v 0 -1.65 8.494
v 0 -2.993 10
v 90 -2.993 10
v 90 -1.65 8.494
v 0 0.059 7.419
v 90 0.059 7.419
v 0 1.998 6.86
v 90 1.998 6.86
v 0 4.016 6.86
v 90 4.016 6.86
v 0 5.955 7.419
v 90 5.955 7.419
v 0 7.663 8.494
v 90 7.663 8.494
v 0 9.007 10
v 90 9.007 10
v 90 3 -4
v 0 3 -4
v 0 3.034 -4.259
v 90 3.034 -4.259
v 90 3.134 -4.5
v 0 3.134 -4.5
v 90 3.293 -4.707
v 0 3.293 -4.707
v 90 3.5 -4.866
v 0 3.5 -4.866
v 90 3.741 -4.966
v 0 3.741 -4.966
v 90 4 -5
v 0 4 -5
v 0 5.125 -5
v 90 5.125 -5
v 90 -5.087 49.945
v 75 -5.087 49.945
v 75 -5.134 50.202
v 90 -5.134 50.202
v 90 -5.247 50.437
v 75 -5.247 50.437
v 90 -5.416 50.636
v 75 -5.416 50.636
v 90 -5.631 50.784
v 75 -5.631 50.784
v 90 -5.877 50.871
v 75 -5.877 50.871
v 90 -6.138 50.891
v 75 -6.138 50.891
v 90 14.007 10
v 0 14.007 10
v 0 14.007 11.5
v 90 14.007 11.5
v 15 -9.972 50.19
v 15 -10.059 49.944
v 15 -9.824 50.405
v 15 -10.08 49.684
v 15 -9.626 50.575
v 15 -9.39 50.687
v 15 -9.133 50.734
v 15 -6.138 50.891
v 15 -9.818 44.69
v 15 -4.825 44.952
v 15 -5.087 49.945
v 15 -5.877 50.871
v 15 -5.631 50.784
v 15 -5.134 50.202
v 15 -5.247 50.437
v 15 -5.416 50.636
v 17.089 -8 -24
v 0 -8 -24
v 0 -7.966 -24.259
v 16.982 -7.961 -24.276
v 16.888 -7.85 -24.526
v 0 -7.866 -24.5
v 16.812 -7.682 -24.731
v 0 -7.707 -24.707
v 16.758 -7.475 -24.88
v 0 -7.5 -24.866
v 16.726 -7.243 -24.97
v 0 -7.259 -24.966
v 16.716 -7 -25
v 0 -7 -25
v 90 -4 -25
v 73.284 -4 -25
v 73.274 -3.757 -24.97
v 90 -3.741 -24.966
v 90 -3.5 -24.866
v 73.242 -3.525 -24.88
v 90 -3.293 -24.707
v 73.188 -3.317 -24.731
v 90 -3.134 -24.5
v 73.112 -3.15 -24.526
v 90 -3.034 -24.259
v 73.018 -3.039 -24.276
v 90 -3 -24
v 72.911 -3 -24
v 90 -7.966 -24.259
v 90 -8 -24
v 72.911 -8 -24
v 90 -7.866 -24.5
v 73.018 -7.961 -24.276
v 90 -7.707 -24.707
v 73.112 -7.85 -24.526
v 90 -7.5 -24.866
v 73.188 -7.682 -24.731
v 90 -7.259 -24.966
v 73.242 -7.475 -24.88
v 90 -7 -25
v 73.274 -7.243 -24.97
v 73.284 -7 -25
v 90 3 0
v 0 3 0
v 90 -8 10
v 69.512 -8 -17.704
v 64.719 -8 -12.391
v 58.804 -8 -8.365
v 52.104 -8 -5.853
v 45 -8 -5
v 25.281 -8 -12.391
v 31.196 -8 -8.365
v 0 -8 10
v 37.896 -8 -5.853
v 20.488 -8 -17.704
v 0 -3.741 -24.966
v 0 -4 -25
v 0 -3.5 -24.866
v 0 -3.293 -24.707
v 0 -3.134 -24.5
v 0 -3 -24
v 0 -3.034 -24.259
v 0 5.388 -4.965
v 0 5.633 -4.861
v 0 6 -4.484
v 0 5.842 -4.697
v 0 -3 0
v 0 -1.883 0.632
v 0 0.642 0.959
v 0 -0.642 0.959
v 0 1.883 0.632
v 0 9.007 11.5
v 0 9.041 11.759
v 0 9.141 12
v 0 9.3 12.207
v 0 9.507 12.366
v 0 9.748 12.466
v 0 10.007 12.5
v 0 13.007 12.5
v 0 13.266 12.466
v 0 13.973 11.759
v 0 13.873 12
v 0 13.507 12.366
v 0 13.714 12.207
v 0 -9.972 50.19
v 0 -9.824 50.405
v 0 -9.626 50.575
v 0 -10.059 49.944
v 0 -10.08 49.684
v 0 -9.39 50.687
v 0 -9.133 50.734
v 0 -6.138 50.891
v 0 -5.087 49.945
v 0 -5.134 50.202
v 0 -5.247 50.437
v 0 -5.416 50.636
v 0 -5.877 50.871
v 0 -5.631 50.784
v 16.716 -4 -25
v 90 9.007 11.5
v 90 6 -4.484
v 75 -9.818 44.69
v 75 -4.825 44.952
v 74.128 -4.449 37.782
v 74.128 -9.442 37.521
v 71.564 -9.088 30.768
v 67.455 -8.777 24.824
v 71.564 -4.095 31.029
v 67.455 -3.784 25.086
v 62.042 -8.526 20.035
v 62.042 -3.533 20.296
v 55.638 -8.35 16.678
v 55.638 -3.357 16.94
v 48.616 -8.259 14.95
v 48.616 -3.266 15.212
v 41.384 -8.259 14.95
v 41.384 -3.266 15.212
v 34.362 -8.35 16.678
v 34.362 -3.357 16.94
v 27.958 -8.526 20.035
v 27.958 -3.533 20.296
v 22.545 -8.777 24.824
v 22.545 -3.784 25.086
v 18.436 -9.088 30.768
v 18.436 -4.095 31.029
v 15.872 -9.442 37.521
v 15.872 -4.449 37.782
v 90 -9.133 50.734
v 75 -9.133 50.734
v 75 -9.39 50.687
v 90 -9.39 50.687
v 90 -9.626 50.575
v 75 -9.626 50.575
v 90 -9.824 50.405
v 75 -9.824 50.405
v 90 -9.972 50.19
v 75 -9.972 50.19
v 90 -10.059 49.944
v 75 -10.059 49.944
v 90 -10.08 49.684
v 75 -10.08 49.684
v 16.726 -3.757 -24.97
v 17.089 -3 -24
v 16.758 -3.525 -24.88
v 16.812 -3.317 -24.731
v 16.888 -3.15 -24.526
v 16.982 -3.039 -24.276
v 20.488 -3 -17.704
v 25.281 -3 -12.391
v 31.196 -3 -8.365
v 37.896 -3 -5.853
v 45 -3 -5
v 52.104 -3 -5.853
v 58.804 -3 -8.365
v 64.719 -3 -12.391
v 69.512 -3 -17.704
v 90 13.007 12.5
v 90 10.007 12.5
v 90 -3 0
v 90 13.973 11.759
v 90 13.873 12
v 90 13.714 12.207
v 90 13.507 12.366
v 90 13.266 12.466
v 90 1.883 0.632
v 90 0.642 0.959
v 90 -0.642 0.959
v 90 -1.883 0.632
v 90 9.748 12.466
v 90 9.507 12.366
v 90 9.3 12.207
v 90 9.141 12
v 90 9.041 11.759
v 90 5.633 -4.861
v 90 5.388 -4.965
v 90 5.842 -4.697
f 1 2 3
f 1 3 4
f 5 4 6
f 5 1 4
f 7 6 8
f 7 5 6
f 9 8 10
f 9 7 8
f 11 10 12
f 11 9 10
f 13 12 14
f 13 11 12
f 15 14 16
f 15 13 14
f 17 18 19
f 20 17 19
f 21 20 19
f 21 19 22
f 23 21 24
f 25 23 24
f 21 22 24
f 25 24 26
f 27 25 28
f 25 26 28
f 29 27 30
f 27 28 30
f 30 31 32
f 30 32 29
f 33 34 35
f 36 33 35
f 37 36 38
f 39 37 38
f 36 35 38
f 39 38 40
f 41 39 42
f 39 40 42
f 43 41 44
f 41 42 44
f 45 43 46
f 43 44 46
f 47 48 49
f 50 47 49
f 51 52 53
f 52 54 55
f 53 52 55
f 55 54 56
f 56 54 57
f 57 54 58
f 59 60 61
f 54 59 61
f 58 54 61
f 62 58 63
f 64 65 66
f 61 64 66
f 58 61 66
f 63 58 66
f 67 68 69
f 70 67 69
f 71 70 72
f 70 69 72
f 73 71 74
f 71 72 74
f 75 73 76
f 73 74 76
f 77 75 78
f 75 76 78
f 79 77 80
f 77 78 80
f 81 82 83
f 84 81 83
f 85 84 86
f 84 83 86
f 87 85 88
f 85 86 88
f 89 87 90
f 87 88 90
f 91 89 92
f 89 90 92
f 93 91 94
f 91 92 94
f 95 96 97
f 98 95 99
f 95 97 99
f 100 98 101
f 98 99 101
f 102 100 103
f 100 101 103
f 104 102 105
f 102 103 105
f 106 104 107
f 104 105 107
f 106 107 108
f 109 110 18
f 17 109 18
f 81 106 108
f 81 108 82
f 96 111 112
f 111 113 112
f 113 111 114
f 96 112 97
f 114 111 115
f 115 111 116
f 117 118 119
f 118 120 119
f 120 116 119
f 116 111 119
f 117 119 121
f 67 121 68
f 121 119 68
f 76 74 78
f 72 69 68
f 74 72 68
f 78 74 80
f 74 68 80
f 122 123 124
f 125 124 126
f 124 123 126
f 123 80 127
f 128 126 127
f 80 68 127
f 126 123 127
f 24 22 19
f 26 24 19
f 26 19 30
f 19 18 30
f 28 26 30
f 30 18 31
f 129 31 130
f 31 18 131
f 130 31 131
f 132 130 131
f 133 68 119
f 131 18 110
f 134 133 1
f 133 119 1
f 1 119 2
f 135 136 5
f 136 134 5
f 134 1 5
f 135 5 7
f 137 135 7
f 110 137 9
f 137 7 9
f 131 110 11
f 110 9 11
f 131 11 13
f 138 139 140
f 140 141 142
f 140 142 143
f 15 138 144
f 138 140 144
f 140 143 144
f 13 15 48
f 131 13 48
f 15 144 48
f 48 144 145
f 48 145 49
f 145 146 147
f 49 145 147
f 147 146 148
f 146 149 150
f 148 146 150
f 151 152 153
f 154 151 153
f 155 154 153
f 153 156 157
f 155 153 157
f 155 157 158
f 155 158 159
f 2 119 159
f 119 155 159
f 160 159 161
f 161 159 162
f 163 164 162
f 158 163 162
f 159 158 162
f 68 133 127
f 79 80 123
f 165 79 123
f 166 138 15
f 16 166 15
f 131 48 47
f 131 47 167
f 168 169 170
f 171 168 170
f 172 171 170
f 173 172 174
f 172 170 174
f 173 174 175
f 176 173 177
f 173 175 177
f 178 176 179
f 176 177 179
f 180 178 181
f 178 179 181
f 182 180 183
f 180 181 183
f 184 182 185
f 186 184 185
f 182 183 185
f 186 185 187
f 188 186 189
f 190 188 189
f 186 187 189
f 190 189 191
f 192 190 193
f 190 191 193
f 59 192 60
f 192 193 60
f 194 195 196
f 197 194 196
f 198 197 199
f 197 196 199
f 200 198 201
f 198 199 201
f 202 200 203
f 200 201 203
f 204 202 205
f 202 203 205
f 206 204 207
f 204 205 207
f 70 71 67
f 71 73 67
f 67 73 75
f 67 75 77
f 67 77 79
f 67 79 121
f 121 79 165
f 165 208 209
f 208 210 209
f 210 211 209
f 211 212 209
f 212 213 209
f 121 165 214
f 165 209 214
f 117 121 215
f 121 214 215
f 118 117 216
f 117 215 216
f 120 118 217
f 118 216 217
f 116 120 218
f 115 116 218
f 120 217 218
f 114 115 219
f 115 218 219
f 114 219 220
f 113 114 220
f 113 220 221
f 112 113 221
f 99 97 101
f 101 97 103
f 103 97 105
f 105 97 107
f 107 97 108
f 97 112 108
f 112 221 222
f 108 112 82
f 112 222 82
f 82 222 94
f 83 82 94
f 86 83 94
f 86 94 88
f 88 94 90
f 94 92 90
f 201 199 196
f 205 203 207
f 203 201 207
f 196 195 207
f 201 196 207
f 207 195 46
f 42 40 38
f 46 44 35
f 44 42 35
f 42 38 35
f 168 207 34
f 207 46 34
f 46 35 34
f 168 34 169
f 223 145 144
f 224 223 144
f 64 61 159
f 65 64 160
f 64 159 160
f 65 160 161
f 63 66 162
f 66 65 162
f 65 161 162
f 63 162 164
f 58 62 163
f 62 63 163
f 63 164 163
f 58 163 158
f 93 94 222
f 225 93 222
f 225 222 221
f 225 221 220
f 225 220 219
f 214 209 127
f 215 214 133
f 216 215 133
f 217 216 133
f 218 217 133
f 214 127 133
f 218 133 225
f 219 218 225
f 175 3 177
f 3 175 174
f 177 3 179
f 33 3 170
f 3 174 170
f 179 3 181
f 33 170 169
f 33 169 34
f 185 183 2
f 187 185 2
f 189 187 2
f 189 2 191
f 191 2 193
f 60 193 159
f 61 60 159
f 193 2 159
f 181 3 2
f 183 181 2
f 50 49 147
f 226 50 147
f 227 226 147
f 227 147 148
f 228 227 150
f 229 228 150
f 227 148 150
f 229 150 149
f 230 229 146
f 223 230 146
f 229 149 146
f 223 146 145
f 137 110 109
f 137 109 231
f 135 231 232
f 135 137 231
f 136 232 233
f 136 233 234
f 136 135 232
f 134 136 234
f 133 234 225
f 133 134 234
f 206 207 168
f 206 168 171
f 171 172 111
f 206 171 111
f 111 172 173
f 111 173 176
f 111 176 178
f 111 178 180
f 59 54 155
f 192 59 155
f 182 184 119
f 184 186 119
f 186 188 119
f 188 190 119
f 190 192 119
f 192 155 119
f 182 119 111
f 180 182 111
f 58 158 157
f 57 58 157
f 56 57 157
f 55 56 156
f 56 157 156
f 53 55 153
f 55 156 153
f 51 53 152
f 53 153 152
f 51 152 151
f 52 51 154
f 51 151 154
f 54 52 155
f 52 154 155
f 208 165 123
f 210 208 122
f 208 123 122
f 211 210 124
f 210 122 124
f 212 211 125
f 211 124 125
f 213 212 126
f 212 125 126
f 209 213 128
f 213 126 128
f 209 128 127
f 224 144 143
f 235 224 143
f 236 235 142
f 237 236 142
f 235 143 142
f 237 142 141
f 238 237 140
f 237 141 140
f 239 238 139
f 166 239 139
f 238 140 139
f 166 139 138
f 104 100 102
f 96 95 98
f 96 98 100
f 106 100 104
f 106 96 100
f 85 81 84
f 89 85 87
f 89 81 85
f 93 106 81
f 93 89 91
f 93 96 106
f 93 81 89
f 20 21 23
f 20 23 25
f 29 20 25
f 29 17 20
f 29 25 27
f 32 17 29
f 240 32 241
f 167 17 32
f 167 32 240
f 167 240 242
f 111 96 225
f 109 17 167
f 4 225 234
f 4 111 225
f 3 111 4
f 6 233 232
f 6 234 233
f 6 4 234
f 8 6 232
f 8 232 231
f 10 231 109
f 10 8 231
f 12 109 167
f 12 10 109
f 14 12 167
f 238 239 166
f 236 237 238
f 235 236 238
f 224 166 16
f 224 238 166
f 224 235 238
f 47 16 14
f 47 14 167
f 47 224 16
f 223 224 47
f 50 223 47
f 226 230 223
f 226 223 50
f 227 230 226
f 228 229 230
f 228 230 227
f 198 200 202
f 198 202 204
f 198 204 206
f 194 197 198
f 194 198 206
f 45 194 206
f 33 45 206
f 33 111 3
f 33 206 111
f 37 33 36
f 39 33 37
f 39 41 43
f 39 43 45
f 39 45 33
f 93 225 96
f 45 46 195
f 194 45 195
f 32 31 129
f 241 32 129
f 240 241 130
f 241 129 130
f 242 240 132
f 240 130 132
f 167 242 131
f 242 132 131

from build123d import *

# Parameters (mm, degrees)
PAD_DEPTH       = 90
POCKET_DEPTH    = 8.9110010593
POCKET001_DEPTH = 7.0820946587


with BuildPart() as part:
    # Sketch → Pad (new body)
    with BuildSketch(Plane.YZ):
        with BuildLine():
            Line((-7, -25), (-4, -25))
            ThreePointArc((-4, -25), (-3.2928932188, -24.7071067812), (-3, -24))
            Line((-3, -24), (-3, 0))
            ThreePointArc((3, 0), (0, 1), (-3, 0))
            Line((3, 0), (3, -4))
            ThreePointArc((3, -4), (3.2928932188, -4.7071067812), (4, -5))
            Line((5.124826301, -5), (4, -5))
            ThreePointArc((5.124826301, -5), (5.6328573812, -4.8613387379), (6, -4.483808843))
            Line((14.00686173, 10), (6, -4.483808843))
            Line((14.00686173, 10), (14.00686173, 11.5))
            ThreePointArc((14.00686173, 11.5), (13.7139685112, 12.2071067812), (13.00686173, 12.5))
            Line((13.00686173, 12.5), (10.00686173, 12.5))
            ThreePointArc((10.00686173, 12.5), (9.2997549488, 12.2071067812), (9.00686173, 11.5))
            Line((9.00686173, 11.5), (9.00686173, 10))
            ThreePointArc((-2.99313827, 10), (3.00686173, 6.7888974491), (9.00686173, 10))
            Line((-2.99313827, 10), (-5.0865765197, 49.9451813902))
            ThreePointArc((-5.0865765197, 49.9451813902), (-5.4160754481, 50.6359902594), (-6.1375420107, 50.8914749687))
            Line((-6.1375420107, 50.8914749687), (-9.133430615, 50.7344671))
            ThreePointArc((-9.133430615, 50.7344671), (-9.8242394842, 50.4049681716), (-10.0797241935, 49.683501609))
            Line((-10.0797241935, 49.683501609), (-8, 10))
            Line((-8, 10), (-8, -24))
            ThreePointArc((-8, -24), (-7.7071067812, -24.7071067812), (-7, -25))
        make_face()
    extrude(amount=PAD_DEPTH)

    # Sketch002 (on Face1 of Pad) → Pocket (cut, through all)
    with BuildSketch(Plane(origin=(0, -2.4622975914, -0.1290435487), x_dir=(0, -0.0523359562, 0.9986295348), z_dir=(0, 0.9986295348, 0.0523359562))):
        with BuildLine():
            Line((51.1429441011, 75), (45.1429441011, 75))
            ThreePointArc((45.1429441011, 75), (15.1429441011, 45), (45.1429441011, 15))
            Line((45.1429441011, 15), (51.1429441011, 15))
            Line((51.1429441011, 15), (51.1429441011, 75))
        make_face()
    extrude(amount=-POCKET_DEPTH, mode=Mode.SUBTRACT)

    # Sketch003 (on Face17 of Pocket) → Pocket001 (cut, through all)
    with BuildSketch(Plane.ZX.offset(-3)):
        with BuildLine():
            Line((-75, 75), (-35, 75))
            ThreePointArc((-35, 15), (-5, 45), (-35, 75))
            Line((-35, 15), (-75, 15))
            Line((-75, 15), (-75, 75))
        make_face()
    extrude(amount=-POCKET001_DEPTH, mode=Mode.SUBTRACT)


solid = part.part
